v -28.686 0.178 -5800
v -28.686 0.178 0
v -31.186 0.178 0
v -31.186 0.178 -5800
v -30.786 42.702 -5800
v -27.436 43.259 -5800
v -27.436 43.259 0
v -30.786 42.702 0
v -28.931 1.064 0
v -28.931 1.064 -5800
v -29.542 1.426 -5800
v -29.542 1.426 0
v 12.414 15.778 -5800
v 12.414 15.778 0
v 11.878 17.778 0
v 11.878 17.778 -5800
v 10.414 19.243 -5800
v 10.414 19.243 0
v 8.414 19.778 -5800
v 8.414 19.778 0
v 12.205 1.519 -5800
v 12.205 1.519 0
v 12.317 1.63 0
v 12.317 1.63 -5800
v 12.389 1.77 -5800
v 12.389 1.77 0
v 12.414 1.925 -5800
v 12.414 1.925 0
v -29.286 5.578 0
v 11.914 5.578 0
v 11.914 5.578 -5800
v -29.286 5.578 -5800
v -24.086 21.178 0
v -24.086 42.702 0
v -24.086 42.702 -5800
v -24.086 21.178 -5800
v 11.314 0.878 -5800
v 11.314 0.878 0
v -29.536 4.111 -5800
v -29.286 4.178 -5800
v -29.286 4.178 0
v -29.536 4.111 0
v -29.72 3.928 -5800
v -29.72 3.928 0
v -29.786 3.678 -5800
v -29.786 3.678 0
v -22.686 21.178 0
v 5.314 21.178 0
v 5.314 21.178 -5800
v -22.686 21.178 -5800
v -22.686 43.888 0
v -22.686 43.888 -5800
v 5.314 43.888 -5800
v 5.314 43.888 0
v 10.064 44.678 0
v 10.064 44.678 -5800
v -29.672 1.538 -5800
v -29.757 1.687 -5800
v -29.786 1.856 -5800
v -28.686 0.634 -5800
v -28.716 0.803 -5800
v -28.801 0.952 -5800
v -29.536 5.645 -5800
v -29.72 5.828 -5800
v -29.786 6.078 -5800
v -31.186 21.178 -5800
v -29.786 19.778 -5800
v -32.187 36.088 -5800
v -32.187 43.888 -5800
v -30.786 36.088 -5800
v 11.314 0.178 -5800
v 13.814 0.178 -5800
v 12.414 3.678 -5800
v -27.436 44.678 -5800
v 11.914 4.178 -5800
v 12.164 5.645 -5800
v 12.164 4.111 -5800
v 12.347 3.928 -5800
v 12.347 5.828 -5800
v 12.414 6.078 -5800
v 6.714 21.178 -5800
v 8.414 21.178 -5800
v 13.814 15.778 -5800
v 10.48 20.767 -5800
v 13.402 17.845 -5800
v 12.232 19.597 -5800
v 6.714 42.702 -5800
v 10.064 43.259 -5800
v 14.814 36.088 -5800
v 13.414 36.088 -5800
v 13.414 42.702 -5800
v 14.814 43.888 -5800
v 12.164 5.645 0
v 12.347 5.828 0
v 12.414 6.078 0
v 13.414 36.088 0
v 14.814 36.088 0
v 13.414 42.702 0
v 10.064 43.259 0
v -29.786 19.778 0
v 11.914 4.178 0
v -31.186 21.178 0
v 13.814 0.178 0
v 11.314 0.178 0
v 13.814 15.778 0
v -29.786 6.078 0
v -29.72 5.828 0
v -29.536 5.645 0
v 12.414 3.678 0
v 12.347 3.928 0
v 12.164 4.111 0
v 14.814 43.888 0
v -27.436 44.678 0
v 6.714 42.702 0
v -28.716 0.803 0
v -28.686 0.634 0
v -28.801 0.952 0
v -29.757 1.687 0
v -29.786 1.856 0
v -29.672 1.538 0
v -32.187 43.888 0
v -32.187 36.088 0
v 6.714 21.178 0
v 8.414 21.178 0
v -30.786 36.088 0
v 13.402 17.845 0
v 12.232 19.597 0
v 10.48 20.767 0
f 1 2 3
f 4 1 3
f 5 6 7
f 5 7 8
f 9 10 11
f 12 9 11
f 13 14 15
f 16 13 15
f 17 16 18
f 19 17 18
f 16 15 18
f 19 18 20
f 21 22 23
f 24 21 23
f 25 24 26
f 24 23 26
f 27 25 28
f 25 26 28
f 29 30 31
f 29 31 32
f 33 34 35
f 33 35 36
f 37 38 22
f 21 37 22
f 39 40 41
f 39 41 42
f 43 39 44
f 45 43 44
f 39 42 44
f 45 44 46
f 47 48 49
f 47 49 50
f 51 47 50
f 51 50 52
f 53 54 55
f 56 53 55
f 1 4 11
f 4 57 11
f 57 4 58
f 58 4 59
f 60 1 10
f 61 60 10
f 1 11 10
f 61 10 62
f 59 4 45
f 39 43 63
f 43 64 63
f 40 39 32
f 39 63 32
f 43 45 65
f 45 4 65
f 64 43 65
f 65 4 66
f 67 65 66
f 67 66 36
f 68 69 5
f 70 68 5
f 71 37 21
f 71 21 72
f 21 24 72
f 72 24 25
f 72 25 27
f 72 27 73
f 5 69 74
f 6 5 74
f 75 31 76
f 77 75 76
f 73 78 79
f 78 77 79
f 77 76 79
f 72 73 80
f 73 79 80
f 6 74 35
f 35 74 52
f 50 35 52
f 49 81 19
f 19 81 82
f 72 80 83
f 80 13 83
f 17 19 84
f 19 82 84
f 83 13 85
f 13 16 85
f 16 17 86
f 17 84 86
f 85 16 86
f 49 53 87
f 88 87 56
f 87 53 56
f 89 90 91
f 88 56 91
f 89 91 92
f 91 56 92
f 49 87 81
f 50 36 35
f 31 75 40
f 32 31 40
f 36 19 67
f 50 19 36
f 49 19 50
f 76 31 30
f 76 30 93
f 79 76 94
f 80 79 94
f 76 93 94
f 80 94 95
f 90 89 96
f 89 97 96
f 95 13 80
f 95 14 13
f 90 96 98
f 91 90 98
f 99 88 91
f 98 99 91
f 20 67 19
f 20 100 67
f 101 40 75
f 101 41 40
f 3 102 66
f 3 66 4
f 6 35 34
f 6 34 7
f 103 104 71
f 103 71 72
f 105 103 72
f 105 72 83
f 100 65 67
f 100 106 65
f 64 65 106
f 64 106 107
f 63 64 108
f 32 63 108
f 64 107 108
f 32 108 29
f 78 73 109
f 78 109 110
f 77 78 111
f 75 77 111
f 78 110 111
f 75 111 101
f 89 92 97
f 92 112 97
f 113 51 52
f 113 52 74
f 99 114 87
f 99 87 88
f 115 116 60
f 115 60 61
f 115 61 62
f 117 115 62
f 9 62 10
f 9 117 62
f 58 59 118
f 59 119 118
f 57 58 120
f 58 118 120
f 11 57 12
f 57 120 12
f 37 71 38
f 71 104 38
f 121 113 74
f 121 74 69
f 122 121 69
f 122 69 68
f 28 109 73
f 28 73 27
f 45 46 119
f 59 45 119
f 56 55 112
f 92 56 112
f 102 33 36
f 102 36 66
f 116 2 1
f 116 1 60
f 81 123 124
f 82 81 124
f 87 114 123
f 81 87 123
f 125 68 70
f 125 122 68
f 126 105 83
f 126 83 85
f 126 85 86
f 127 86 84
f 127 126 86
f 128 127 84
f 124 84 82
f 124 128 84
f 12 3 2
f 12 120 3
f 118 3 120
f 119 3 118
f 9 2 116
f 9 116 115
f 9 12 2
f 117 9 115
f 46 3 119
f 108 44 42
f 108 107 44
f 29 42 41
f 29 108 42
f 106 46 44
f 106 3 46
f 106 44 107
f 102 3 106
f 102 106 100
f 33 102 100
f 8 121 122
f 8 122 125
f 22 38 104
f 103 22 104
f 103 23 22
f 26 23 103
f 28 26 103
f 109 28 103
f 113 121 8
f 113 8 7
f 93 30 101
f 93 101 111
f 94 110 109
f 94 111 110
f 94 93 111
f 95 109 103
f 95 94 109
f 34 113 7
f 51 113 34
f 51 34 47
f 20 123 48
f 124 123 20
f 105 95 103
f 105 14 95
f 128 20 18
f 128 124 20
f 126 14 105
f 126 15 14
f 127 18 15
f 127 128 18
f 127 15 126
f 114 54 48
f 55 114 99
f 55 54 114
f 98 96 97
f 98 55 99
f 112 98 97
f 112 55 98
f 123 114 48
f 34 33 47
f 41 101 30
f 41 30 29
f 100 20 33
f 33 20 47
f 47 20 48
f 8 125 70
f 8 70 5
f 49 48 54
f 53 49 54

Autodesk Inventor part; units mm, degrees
ref_plane "YZ Plane" through (0, 0, 0) normal (1, 0, 0) x (0, 1, 0)
ref_plane "XZ Plane" through (0, 0, 0) normal (0, 1, 0) x (-1, 0, 0)
ref_plane "XY Plane" through (0, 0, 0) normal (0, 0, 1) x (1, 0, 0)
sketch "Boceto1" plane through (0, 0, 0) normal (0, 0, 1) x (1, 0, 0)
  line L0 (-31.1865, 21.1784) -> (-31.1865, 0.1784)
  line L1 (-29.2865, 4.1784) -> (11.9135, 4.1784)
  line L2 (13.8135, 0.1784) -> (13.8135, 15.7784)
  line L3 (6.7135, 42.7016) -> (6.7135, 21.1784)
  line L4 (-29.7865, 19.7784) -> (8.4135, 19.7784)
  line L5 (12.4135, 15.7784) -> (12.4135, 6.0784)
  line L6 (11.9135, 5.5784) -> (-29.2865, 5.5784)
  line L7 (-29.7865, 6.0784) -> (-29.7865, 19.7784)
  arc A0 (12.4135, 15.7784) -> (8.4135, 19.7784) centre (8.4135, 15.7784) ccw
  line L8 (12.4135, 3.6784) -> (12.4135, 1.9253)
  line L9 (11.3135, 0.1784) -> (13.8135, 0.1784)
  line L10 (5.3135, 21.1784) -> (5.3135, 43.8878)
  line L11 (-29.7865, 3.6784) -> (-29.7865, 1.8562)
  line L12 (-28.6865, 0.1784) -> (-31.1865, 0.1784)
  line L13 (-28.6865, 0.1784) -> (-28.6865, 0.6338)
  line L14 (11.3135, 0.1784) -> (11.3135, 0.8784)
  line L15 (-28.9312, 1.0637) -> (-29.5418, 1.4262)
  line L16 (11.3135, 0.8784) -> (12.2053, 1.5192)
  arc A1 (11.9135, 5.5784) -> (12.4135, 6.0784) centre (11.9135, 6.0784) ccw
  arc A2 (12.4135, 3.6784) -> (11.9135, 4.1784) centre (11.9135, 3.6784) ccw
  arc A3 (12.2053, 1.5192) -> (12.4135, 1.9253) centre (11.9135, 1.9253) ccw
  arc A4 (-29.7865, 6.0784) -> (-29.2865, 5.5784) centre (-29.2865, 6.0784) ccw
  arc A5 (-29.2865, 4.1784) -> (-29.7865, 3.6784) centre (-29.2865, 3.6784) ccw
  arc A6 (-29.7865, 1.8562) -> (-29.5418, 1.4262) centre (-29.2865, 1.8562) ccw
  arc A7 (-28.6865, 0.6338) -> (-28.9312, 1.0637) centre (-29.1865, 0.6338) ccw
  line L17 (5.3135, 43.8878) -> (10.0635, 44.6784)
  line L18 (10.0635, 44.6784) -> (14.8135, 43.8878)
  line L19 (6.7135, 42.7016) -> (10.0635, 43.2591)
  line L20 (10.0635, 43.2591) -> (13.4135, 42.7016)
  line L21 (14.8135, 43.8878) -> (14.8135, 36.0884)
  line L22 (14.8135, 36.0884) -> (13.4135, 36.0884)
  line L23 (13.4135, 36.0884) -> (13.4135, 42.7016)
  line L24 (6.7135, 21.1784) -> (8.4135, 21.1784)
  arc A8 (13.8135, 15.7784) -> (8.4135, 21.1784) centre (8.4135, 15.7784) ccw
  line L25 (10.0635, 52.6138) -> (10.0635, 36.0884) construction
  line L26 (-24.0865, 42.7016) -> (-24.0865, 21.1784)
  line L27 (-22.6865, 21.1784) -> (-22.6865, 43.8878)
  line L28 (-22.6865, 43.8878) -> (-27.4365, 44.6784)
  line L29 (-27.4365, 44.6784) -> (-32.1865, 43.8878)
  line L30 (-24.0865, 42.7016) -> (-27.4365, 43.2591)
  line L31 (-27.4365, 43.2591) -> (-30.7865, 42.7016)
  line L32 (-32.1865, 43.8878) -> (-32.1865, 36.0884)
  line L33 (-32.1865, 36.0884) -> (-30.7865, 36.0884)
  line L34 (-30.7865, 36.0884) -> (-30.7865, 42.7016)
  line L35 (-27.4365, 52.6138) -> (-27.4365, 36.0884) construction
  line L36 (5.3135, 21.1784) -> (-22.6865, 21.1784)
  line L37 (-24.0865, 21.1784) -> (-31.1865, 21.1784)
  line L38 (-8.6865, 50.2757) -> (-8.6865, -0.697) construction
  point P0 (0, 0)
  point P1 (-29.7865, 1.5715)
  point P2 (-28.6865, 0.9184)
  dimension "d17" = 4
  dimension "d24" = 1.4
  dimension "d50" = 0.7
  dimension "d61" = 0.74
  dimension "d62" = 30.7
  dimension "d63" = 35.7
  dimension "d206" = 1.4
  dimension "d207" = 1.4
  dimension "d210" = 1.4
  dimension "d211" = 1.4
  dimension "d213" = 14.2
  dimension "d214" = 1.4
  dimension "d215" = 1.4
  dimension "d216" = 1.4
  dimension "d217" = 1.4
  dimension "d218" = 45
  dimension "d223" = 5.4
  dimension "d224" = 1.4
  dimension "d225" = 9.5
  dimension "d226" = 4.75
  dimension "d227" = 3.35
  dimension "d228" = 6.7
  dimension "d229" = 44.5
  dimension "d230" = 3.35
  dimension "d231" = 2.5
  dimension "d232" = 2.5
  dimension "d240" = 8.59
  dimension "d241" = 3.35
  dimension "d242" = 99.45
  dimension "d243" = 161.1
  dimension "d246" = 1.4
  dimension "d247" = 1.4
  dimension "d248" = 1.4
  dimension "d253" = 1.4
  dimension "d254" = 1.4
  dimension "d255" = 1.4
  dimension "d256" = 1.4
  dimension "d257" = 8.59
  dimension "d258" = 161.1
  dimension "d259" = 99.45
  dimension "d260" = 22.5
  dimension "d266" = 23.5
  dimension "d267" = 47
  dimension "d268" = 3.35
  dimension "d269" = 9.5
  dimension "d270" = 4.75
  dimension "d271" = 3.35
  dimension "d272" = 6.7
  dimension "d273" = 28
  dimension "d274" = 37.5
  dimension "d275" = 8.5
  dimension "d276" = 8.5
  dimension "d277" = 44.5
  dimension "d278" = 0.5
  dimension "d279" = 14.91
  dimension "d280" = 14.91
  dimension "d281" = 14.8135
  dimension "d282" = 36.0884
  dimension "d283" = 16.5254
  dimension "d284" = 0
  dimension "d285" = 14.1873
  dimension "d286" = 36.7854
  dimension "d287" = 16.5254
  dimension "d288" = 0
extrude "Extrusión1" add sketch "Boceto1" against normal blind 5800
properties part number "SP40-09 MARCO CORREDERA" material "Aluminio"
